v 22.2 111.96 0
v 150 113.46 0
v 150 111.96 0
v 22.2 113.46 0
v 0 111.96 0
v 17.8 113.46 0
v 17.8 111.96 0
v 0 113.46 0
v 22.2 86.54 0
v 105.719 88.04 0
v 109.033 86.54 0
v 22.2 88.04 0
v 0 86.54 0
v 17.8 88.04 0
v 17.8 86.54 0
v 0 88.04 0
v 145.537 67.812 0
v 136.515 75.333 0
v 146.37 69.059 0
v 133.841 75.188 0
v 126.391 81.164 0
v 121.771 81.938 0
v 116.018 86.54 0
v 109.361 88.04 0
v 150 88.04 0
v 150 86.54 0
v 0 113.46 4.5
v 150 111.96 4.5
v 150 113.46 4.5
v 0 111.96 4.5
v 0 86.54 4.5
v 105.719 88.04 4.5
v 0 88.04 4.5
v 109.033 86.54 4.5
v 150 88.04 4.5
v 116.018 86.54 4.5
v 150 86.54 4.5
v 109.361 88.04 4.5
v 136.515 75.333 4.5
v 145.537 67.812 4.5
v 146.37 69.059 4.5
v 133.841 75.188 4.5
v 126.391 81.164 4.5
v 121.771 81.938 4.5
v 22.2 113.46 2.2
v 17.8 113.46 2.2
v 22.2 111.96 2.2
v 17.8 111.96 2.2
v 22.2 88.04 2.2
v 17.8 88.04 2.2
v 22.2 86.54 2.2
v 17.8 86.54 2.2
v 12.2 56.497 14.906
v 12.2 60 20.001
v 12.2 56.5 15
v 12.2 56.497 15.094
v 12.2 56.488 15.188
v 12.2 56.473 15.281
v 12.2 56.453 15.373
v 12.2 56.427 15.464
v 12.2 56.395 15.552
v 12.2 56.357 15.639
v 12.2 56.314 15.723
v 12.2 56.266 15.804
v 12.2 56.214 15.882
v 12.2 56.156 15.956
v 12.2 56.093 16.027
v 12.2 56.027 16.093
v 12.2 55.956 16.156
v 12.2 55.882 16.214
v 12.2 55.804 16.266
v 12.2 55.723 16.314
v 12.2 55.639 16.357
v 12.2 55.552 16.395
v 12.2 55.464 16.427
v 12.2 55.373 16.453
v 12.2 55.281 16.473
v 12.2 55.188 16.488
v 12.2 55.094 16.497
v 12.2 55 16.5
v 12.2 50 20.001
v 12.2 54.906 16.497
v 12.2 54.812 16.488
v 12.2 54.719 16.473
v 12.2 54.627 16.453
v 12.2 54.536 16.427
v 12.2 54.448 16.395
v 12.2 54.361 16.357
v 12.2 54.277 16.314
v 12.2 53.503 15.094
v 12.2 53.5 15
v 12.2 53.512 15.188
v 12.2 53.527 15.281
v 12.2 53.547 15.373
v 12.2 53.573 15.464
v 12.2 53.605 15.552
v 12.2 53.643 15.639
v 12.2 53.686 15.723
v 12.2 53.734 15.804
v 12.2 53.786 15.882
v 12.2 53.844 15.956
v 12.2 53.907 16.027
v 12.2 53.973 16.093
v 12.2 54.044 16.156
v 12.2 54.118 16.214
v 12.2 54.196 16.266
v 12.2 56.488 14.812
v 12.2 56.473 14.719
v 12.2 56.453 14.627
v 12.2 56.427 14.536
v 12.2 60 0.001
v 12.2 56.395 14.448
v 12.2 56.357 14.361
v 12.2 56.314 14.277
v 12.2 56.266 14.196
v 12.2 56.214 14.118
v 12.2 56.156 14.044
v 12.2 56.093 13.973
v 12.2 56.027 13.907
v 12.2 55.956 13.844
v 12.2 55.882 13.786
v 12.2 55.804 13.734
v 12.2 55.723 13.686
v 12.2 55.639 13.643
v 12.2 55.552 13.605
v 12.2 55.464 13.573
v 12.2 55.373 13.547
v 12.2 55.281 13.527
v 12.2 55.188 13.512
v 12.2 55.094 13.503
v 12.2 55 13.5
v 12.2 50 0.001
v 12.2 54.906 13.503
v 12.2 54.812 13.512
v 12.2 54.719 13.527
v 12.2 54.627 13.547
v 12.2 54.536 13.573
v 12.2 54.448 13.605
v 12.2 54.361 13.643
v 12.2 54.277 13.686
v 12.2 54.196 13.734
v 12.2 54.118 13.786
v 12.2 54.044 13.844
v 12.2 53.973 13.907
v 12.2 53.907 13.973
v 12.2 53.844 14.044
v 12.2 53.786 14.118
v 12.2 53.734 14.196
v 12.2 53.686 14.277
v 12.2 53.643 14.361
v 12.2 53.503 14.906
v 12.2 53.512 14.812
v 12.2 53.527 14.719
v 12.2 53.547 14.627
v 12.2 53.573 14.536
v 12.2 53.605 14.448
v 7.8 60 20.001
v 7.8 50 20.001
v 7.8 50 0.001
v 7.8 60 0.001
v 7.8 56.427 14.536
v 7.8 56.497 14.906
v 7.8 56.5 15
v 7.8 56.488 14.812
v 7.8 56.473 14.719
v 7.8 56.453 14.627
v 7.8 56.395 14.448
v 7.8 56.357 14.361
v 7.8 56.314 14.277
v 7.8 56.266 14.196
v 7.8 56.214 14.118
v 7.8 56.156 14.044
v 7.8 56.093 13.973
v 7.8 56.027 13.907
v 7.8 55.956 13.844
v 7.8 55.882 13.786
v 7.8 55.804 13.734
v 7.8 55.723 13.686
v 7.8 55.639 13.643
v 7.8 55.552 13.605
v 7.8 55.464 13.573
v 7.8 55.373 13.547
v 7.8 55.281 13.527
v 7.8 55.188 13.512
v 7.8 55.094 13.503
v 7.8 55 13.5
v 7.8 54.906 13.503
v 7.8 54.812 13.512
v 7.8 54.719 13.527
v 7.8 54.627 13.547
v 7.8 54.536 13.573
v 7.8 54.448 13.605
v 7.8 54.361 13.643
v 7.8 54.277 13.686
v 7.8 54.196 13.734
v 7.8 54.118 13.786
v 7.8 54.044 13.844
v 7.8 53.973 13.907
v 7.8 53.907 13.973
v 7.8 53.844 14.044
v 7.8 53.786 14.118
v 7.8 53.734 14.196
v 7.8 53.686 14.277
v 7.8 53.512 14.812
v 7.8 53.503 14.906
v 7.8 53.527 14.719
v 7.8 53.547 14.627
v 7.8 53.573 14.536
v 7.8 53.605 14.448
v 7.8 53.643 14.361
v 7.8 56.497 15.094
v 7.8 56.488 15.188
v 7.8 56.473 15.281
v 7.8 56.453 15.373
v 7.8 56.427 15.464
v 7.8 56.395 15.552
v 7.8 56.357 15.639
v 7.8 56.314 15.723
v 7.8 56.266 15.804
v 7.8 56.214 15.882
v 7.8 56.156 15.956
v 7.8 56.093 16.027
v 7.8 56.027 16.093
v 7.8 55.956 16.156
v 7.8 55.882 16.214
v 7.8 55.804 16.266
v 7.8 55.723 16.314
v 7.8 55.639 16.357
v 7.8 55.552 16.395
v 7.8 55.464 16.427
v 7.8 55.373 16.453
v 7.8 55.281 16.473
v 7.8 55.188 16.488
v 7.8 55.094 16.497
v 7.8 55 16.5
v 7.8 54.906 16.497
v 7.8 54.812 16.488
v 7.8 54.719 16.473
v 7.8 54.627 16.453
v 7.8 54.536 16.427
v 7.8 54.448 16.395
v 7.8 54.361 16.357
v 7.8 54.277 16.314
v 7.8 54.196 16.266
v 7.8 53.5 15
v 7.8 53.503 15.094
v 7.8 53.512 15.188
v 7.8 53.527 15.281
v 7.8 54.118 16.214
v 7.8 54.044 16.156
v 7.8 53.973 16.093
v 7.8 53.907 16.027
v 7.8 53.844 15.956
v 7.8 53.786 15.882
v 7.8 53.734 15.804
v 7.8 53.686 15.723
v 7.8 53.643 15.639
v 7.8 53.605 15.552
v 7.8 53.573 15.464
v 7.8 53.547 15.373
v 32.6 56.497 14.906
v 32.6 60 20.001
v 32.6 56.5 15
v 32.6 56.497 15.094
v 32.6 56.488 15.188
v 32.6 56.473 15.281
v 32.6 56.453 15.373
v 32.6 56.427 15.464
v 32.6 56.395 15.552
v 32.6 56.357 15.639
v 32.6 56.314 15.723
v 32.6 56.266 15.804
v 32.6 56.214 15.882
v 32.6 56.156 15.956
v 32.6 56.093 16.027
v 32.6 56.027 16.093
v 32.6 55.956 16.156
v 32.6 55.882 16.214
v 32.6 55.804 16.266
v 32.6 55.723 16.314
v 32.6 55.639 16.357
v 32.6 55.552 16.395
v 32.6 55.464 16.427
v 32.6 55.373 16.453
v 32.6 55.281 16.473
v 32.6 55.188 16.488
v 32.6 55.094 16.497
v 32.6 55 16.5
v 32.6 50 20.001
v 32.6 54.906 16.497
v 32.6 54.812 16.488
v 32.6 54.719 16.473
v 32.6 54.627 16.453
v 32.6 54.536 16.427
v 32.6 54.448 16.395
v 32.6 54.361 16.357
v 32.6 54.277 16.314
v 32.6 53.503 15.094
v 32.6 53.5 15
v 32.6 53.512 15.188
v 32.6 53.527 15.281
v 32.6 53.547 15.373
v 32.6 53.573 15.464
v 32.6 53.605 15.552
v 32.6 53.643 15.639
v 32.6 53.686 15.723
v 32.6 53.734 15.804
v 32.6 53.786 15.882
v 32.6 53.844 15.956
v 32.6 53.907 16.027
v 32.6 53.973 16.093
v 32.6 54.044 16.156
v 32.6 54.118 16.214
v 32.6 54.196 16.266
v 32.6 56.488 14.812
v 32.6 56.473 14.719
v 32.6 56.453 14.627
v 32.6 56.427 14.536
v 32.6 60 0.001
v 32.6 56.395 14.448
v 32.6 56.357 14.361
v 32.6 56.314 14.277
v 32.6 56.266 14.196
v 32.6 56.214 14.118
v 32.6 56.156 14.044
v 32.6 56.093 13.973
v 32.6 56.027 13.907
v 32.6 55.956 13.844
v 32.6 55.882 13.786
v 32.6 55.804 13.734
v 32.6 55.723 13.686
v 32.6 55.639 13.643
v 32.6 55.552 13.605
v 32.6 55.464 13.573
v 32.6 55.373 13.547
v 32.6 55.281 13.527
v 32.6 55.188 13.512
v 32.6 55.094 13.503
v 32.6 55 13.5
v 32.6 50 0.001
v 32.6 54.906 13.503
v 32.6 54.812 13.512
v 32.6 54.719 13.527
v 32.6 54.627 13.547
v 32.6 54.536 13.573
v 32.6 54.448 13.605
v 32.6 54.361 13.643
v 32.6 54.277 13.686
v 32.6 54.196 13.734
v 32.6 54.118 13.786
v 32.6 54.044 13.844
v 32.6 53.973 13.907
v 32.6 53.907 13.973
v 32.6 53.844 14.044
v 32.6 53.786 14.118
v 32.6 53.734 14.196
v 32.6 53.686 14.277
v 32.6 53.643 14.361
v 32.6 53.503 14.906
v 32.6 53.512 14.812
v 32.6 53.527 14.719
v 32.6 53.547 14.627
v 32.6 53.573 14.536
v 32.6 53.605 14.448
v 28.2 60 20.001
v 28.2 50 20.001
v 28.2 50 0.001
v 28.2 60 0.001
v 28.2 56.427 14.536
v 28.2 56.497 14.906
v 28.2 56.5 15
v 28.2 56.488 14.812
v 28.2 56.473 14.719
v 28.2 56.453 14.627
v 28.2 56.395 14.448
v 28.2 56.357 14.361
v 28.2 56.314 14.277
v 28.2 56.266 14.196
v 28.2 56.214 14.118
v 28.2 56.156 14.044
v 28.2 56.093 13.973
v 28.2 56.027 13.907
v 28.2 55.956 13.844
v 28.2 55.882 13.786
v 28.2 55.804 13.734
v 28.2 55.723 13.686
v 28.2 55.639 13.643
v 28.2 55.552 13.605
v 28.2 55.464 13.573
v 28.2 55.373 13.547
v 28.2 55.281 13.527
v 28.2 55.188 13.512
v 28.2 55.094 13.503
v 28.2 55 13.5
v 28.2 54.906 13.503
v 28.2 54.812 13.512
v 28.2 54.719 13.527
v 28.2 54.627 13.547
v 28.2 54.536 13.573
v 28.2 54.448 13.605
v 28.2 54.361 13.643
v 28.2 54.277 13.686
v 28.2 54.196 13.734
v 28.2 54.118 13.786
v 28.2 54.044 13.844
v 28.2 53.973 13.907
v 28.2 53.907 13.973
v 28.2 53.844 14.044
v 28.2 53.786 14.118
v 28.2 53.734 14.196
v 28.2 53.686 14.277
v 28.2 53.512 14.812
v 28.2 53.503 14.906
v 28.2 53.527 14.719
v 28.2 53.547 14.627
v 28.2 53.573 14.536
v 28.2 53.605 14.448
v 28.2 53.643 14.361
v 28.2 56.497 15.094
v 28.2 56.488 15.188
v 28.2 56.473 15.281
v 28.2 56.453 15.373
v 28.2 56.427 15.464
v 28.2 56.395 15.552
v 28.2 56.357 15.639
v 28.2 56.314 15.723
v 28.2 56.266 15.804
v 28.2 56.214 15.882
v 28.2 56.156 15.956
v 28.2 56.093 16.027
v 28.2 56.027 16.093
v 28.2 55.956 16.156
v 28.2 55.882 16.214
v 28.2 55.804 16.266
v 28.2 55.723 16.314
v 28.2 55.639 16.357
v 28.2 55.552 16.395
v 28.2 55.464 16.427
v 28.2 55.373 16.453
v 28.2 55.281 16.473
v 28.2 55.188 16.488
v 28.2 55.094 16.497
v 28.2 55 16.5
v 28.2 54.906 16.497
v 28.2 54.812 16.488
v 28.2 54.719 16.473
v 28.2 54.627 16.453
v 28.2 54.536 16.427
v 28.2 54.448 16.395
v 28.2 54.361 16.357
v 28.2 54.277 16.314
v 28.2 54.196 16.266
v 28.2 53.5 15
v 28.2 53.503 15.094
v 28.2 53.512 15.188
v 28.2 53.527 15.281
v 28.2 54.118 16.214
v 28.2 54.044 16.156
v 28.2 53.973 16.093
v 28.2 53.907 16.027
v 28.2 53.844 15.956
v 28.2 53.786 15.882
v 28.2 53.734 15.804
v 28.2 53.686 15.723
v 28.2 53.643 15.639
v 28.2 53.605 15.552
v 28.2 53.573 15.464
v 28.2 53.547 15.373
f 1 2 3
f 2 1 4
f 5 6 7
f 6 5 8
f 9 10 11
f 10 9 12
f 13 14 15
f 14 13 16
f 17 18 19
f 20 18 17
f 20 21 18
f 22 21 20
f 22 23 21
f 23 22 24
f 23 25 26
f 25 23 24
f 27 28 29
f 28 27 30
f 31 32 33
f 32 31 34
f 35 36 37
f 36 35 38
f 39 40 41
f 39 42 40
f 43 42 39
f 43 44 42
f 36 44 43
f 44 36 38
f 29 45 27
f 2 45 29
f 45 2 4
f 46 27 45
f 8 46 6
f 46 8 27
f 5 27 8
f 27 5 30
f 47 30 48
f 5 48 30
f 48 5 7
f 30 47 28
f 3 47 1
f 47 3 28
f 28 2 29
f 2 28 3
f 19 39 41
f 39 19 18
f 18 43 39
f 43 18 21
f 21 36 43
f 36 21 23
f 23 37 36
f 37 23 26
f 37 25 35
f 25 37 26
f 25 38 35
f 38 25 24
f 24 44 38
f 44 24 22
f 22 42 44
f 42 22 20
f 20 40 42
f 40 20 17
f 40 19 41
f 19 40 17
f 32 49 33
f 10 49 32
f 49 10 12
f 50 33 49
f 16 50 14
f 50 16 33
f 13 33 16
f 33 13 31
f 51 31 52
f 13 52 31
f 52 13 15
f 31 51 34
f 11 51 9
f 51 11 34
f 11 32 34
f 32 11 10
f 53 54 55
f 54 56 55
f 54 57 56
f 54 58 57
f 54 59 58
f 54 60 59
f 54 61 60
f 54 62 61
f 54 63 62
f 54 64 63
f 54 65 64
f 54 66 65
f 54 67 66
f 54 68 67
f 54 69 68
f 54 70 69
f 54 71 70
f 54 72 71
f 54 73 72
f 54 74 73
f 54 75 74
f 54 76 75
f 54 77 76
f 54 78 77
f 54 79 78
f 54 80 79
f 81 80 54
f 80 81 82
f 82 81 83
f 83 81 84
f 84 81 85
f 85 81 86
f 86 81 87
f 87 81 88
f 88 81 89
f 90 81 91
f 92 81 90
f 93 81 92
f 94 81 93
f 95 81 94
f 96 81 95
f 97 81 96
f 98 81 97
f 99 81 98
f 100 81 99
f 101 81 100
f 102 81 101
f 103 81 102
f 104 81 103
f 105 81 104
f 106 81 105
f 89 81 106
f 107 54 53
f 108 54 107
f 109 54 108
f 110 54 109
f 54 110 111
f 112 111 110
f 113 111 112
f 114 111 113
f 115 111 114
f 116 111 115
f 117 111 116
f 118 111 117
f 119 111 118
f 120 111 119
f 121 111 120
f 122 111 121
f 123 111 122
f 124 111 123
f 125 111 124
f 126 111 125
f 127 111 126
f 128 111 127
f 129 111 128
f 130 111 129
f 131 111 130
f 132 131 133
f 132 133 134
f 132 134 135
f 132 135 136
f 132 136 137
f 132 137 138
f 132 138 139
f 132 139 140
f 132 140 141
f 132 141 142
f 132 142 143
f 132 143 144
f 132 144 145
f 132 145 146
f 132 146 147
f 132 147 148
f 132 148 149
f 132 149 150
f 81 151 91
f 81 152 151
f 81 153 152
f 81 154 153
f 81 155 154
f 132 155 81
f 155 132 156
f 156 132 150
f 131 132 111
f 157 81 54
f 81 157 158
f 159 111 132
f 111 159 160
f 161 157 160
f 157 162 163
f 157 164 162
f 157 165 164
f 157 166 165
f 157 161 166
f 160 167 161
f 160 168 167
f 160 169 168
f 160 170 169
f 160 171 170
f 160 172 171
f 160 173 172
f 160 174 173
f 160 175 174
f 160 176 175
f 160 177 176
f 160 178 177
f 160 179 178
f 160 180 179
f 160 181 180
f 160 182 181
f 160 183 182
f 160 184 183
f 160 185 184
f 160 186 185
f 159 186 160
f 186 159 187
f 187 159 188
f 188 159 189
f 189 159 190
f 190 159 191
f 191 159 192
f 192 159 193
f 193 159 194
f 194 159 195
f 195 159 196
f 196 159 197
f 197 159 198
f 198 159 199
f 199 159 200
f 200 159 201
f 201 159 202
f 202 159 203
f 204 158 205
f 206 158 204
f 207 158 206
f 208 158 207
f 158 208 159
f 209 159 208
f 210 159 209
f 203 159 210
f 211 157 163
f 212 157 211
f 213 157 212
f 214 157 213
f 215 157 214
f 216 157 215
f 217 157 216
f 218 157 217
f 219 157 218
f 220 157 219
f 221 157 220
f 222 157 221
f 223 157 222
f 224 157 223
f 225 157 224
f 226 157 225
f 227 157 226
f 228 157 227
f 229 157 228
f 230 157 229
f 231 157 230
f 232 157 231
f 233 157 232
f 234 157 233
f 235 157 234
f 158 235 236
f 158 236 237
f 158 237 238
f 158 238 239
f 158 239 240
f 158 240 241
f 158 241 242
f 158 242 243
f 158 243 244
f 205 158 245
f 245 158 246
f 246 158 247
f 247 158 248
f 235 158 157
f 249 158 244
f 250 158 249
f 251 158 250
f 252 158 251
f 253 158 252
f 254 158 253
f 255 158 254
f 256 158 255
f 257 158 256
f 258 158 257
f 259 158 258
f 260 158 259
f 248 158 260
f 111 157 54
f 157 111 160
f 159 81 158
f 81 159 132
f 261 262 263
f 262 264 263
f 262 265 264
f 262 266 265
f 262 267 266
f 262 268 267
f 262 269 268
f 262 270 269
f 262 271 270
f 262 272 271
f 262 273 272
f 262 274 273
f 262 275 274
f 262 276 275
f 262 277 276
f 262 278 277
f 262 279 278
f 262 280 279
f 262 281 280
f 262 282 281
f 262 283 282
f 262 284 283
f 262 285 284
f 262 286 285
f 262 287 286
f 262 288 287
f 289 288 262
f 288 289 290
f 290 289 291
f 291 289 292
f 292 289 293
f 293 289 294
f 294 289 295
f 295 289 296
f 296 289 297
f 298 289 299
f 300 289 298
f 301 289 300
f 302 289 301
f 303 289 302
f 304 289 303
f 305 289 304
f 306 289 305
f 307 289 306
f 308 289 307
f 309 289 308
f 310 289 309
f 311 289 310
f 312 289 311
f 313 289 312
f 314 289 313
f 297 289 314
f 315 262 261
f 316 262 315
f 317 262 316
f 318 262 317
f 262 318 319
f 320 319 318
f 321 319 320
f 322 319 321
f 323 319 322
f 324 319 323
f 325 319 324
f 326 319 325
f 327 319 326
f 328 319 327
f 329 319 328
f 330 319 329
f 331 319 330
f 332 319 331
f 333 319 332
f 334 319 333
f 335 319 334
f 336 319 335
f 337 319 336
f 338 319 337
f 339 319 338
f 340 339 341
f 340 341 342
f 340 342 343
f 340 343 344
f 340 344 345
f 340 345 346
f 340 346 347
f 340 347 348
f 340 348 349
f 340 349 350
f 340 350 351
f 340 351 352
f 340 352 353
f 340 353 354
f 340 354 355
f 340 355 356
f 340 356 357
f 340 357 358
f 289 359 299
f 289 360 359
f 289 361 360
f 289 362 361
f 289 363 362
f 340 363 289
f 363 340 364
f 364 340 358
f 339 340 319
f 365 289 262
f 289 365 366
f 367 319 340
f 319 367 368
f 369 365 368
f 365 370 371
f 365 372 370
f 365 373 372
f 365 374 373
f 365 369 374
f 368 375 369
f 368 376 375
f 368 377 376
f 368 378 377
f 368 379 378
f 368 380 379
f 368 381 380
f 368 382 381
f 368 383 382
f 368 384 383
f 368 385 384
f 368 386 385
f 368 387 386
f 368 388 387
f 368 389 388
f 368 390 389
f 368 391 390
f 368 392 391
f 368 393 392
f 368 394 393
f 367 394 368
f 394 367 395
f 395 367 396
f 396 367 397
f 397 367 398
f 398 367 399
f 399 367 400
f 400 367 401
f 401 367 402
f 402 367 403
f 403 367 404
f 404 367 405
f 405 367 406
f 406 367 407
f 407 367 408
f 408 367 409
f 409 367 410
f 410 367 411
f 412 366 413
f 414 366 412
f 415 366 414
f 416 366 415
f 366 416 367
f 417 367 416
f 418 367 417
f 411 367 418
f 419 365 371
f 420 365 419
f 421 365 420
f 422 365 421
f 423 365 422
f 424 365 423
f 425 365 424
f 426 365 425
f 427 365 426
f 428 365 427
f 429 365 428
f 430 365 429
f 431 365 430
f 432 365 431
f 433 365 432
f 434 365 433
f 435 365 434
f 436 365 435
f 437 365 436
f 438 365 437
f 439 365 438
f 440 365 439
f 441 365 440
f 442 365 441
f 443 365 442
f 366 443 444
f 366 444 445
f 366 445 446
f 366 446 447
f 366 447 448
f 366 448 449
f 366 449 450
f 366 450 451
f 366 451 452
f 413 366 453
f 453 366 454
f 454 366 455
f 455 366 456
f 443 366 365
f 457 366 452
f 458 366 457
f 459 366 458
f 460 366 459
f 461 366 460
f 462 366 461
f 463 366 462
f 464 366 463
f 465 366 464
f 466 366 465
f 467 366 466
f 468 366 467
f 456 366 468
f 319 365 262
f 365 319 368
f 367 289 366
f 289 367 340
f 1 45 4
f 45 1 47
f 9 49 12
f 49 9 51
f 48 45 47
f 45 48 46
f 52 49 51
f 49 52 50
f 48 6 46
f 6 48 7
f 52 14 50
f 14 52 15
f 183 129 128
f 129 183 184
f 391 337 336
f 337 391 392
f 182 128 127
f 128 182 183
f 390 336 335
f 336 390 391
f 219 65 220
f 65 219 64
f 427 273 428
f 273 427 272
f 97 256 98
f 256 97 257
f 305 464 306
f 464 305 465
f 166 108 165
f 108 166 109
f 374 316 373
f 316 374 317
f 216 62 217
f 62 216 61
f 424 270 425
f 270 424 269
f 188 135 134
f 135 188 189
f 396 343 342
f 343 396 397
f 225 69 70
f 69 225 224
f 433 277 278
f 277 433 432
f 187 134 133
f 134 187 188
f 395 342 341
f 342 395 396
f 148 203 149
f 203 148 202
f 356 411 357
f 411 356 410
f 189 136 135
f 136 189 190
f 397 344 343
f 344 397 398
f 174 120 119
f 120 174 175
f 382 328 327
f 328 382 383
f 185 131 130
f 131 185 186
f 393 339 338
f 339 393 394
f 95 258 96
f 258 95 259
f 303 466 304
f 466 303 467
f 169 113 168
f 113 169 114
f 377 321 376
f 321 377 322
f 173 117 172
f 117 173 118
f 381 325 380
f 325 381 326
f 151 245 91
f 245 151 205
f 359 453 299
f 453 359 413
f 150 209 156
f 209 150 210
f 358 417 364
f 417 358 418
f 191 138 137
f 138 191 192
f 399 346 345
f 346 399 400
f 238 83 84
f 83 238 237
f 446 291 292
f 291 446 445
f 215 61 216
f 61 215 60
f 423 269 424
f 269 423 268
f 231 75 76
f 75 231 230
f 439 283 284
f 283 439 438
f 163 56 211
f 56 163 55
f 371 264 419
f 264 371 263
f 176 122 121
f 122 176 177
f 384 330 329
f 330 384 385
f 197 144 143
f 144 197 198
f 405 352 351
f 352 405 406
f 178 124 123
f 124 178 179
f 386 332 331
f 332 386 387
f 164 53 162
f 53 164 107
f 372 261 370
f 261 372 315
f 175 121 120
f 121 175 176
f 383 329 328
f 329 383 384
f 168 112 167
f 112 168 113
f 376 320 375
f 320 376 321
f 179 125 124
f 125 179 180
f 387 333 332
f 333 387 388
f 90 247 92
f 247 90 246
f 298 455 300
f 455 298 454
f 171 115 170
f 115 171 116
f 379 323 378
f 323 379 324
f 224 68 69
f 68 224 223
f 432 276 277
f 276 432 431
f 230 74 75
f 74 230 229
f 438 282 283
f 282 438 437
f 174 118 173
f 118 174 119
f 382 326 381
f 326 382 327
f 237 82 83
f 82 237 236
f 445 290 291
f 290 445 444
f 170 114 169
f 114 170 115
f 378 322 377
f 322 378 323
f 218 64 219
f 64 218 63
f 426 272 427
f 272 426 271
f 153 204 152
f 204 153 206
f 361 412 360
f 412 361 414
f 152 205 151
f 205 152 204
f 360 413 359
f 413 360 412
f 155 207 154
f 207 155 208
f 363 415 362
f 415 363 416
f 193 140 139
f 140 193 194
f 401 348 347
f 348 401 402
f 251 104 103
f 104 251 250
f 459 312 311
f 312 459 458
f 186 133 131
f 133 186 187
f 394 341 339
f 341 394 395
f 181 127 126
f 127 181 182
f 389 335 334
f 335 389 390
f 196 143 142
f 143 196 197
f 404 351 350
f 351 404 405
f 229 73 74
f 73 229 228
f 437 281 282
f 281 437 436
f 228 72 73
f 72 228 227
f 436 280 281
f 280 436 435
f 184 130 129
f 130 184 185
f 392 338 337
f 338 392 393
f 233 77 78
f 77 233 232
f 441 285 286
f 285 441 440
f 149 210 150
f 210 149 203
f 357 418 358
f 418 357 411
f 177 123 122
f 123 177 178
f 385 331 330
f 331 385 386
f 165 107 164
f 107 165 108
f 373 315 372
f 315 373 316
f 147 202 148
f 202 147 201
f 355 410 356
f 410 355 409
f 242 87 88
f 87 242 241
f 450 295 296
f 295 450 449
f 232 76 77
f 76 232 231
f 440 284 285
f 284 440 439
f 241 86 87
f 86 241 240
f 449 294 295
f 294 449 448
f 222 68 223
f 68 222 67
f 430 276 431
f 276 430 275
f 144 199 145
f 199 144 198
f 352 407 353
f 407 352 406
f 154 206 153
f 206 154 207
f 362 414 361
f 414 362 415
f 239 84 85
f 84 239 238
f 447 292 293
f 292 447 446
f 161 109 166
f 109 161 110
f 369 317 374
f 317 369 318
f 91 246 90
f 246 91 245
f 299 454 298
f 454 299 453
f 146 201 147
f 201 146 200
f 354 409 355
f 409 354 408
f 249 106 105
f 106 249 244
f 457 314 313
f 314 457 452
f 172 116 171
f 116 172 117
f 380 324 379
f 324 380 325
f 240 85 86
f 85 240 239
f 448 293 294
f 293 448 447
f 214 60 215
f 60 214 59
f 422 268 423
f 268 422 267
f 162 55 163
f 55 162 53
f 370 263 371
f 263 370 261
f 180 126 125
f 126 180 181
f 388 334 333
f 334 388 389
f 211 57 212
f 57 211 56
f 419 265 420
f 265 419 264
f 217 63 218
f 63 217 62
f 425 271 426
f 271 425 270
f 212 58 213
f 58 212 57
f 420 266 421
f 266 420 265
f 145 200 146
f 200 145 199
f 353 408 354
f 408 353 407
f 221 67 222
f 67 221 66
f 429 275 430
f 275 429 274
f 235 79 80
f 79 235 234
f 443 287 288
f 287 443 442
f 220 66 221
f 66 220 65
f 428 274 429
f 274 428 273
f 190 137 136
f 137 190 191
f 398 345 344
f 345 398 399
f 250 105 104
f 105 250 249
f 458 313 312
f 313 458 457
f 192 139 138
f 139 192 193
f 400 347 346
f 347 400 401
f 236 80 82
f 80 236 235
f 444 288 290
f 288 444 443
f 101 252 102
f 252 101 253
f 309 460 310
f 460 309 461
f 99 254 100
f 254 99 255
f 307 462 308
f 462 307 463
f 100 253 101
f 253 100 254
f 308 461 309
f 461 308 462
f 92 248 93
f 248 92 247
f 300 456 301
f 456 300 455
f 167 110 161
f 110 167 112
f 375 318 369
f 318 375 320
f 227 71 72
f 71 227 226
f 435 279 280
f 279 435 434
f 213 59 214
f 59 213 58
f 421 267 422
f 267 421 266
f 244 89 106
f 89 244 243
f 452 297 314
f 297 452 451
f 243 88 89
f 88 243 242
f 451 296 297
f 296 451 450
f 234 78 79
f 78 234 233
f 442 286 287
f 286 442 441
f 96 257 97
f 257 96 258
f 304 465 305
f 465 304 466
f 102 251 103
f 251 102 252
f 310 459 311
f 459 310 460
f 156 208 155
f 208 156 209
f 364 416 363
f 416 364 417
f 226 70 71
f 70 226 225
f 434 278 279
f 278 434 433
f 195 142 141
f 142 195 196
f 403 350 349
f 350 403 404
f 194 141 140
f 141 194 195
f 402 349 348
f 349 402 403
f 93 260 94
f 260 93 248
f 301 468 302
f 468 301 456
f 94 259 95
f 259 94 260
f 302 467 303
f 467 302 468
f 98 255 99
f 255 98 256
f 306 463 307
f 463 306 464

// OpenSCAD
module aiguillage(){
    translate([-100,50,0])
      difference(){
        union(){

        linear_extrude (height=2)
            import (file="rails.dxf", layer="aiguillages-traverses", $fn=100);
          
        linear_extrude (height=4.5)
            import (file="rails.dxf", layer="aiguillages", $fn=100);
            translate([107.8,0,0.001])
            cube([4.4,10,20]);  
            translate([107.8 + 20.4 ,0,0.001])
            cube([4.4,10,20]);           
        }
       union(){
       //espacement pour faire coulisser la traverse
       translate([117.8,27.2,0])
       #cube([4.4,46,2.2]);
       //nut hole
       translate([100,5,15])
       rotate([0,90,0])    
       cylinder( h=70, r=1.5, , $fn=100);
           
       }
    }
}

module aiguilles(){
    translate([-100,50,0])
    difference(){
    union(){
        
           translate([0,0,2.01])   
            linear_extrude (height=2.5)
                import (file="rails.dxf", layer="aiguillages-movables-parts", $fn=100);
        
            linear_extrude (height=2.02)
                import (file="rails.dxf", layer="aiguilles-down", $fn=100);
        
            translate([117.8,0,0.001])
                cube([4.4,10,5]);  

        
        }
    
               //nut hole
       translate([100,5,2])
       rotate([0,90,0])    
       cylinder( h=70, r=1.5, , $fn=100);
        
    
    }
}

aiguillage();
//aiguilles();
        
